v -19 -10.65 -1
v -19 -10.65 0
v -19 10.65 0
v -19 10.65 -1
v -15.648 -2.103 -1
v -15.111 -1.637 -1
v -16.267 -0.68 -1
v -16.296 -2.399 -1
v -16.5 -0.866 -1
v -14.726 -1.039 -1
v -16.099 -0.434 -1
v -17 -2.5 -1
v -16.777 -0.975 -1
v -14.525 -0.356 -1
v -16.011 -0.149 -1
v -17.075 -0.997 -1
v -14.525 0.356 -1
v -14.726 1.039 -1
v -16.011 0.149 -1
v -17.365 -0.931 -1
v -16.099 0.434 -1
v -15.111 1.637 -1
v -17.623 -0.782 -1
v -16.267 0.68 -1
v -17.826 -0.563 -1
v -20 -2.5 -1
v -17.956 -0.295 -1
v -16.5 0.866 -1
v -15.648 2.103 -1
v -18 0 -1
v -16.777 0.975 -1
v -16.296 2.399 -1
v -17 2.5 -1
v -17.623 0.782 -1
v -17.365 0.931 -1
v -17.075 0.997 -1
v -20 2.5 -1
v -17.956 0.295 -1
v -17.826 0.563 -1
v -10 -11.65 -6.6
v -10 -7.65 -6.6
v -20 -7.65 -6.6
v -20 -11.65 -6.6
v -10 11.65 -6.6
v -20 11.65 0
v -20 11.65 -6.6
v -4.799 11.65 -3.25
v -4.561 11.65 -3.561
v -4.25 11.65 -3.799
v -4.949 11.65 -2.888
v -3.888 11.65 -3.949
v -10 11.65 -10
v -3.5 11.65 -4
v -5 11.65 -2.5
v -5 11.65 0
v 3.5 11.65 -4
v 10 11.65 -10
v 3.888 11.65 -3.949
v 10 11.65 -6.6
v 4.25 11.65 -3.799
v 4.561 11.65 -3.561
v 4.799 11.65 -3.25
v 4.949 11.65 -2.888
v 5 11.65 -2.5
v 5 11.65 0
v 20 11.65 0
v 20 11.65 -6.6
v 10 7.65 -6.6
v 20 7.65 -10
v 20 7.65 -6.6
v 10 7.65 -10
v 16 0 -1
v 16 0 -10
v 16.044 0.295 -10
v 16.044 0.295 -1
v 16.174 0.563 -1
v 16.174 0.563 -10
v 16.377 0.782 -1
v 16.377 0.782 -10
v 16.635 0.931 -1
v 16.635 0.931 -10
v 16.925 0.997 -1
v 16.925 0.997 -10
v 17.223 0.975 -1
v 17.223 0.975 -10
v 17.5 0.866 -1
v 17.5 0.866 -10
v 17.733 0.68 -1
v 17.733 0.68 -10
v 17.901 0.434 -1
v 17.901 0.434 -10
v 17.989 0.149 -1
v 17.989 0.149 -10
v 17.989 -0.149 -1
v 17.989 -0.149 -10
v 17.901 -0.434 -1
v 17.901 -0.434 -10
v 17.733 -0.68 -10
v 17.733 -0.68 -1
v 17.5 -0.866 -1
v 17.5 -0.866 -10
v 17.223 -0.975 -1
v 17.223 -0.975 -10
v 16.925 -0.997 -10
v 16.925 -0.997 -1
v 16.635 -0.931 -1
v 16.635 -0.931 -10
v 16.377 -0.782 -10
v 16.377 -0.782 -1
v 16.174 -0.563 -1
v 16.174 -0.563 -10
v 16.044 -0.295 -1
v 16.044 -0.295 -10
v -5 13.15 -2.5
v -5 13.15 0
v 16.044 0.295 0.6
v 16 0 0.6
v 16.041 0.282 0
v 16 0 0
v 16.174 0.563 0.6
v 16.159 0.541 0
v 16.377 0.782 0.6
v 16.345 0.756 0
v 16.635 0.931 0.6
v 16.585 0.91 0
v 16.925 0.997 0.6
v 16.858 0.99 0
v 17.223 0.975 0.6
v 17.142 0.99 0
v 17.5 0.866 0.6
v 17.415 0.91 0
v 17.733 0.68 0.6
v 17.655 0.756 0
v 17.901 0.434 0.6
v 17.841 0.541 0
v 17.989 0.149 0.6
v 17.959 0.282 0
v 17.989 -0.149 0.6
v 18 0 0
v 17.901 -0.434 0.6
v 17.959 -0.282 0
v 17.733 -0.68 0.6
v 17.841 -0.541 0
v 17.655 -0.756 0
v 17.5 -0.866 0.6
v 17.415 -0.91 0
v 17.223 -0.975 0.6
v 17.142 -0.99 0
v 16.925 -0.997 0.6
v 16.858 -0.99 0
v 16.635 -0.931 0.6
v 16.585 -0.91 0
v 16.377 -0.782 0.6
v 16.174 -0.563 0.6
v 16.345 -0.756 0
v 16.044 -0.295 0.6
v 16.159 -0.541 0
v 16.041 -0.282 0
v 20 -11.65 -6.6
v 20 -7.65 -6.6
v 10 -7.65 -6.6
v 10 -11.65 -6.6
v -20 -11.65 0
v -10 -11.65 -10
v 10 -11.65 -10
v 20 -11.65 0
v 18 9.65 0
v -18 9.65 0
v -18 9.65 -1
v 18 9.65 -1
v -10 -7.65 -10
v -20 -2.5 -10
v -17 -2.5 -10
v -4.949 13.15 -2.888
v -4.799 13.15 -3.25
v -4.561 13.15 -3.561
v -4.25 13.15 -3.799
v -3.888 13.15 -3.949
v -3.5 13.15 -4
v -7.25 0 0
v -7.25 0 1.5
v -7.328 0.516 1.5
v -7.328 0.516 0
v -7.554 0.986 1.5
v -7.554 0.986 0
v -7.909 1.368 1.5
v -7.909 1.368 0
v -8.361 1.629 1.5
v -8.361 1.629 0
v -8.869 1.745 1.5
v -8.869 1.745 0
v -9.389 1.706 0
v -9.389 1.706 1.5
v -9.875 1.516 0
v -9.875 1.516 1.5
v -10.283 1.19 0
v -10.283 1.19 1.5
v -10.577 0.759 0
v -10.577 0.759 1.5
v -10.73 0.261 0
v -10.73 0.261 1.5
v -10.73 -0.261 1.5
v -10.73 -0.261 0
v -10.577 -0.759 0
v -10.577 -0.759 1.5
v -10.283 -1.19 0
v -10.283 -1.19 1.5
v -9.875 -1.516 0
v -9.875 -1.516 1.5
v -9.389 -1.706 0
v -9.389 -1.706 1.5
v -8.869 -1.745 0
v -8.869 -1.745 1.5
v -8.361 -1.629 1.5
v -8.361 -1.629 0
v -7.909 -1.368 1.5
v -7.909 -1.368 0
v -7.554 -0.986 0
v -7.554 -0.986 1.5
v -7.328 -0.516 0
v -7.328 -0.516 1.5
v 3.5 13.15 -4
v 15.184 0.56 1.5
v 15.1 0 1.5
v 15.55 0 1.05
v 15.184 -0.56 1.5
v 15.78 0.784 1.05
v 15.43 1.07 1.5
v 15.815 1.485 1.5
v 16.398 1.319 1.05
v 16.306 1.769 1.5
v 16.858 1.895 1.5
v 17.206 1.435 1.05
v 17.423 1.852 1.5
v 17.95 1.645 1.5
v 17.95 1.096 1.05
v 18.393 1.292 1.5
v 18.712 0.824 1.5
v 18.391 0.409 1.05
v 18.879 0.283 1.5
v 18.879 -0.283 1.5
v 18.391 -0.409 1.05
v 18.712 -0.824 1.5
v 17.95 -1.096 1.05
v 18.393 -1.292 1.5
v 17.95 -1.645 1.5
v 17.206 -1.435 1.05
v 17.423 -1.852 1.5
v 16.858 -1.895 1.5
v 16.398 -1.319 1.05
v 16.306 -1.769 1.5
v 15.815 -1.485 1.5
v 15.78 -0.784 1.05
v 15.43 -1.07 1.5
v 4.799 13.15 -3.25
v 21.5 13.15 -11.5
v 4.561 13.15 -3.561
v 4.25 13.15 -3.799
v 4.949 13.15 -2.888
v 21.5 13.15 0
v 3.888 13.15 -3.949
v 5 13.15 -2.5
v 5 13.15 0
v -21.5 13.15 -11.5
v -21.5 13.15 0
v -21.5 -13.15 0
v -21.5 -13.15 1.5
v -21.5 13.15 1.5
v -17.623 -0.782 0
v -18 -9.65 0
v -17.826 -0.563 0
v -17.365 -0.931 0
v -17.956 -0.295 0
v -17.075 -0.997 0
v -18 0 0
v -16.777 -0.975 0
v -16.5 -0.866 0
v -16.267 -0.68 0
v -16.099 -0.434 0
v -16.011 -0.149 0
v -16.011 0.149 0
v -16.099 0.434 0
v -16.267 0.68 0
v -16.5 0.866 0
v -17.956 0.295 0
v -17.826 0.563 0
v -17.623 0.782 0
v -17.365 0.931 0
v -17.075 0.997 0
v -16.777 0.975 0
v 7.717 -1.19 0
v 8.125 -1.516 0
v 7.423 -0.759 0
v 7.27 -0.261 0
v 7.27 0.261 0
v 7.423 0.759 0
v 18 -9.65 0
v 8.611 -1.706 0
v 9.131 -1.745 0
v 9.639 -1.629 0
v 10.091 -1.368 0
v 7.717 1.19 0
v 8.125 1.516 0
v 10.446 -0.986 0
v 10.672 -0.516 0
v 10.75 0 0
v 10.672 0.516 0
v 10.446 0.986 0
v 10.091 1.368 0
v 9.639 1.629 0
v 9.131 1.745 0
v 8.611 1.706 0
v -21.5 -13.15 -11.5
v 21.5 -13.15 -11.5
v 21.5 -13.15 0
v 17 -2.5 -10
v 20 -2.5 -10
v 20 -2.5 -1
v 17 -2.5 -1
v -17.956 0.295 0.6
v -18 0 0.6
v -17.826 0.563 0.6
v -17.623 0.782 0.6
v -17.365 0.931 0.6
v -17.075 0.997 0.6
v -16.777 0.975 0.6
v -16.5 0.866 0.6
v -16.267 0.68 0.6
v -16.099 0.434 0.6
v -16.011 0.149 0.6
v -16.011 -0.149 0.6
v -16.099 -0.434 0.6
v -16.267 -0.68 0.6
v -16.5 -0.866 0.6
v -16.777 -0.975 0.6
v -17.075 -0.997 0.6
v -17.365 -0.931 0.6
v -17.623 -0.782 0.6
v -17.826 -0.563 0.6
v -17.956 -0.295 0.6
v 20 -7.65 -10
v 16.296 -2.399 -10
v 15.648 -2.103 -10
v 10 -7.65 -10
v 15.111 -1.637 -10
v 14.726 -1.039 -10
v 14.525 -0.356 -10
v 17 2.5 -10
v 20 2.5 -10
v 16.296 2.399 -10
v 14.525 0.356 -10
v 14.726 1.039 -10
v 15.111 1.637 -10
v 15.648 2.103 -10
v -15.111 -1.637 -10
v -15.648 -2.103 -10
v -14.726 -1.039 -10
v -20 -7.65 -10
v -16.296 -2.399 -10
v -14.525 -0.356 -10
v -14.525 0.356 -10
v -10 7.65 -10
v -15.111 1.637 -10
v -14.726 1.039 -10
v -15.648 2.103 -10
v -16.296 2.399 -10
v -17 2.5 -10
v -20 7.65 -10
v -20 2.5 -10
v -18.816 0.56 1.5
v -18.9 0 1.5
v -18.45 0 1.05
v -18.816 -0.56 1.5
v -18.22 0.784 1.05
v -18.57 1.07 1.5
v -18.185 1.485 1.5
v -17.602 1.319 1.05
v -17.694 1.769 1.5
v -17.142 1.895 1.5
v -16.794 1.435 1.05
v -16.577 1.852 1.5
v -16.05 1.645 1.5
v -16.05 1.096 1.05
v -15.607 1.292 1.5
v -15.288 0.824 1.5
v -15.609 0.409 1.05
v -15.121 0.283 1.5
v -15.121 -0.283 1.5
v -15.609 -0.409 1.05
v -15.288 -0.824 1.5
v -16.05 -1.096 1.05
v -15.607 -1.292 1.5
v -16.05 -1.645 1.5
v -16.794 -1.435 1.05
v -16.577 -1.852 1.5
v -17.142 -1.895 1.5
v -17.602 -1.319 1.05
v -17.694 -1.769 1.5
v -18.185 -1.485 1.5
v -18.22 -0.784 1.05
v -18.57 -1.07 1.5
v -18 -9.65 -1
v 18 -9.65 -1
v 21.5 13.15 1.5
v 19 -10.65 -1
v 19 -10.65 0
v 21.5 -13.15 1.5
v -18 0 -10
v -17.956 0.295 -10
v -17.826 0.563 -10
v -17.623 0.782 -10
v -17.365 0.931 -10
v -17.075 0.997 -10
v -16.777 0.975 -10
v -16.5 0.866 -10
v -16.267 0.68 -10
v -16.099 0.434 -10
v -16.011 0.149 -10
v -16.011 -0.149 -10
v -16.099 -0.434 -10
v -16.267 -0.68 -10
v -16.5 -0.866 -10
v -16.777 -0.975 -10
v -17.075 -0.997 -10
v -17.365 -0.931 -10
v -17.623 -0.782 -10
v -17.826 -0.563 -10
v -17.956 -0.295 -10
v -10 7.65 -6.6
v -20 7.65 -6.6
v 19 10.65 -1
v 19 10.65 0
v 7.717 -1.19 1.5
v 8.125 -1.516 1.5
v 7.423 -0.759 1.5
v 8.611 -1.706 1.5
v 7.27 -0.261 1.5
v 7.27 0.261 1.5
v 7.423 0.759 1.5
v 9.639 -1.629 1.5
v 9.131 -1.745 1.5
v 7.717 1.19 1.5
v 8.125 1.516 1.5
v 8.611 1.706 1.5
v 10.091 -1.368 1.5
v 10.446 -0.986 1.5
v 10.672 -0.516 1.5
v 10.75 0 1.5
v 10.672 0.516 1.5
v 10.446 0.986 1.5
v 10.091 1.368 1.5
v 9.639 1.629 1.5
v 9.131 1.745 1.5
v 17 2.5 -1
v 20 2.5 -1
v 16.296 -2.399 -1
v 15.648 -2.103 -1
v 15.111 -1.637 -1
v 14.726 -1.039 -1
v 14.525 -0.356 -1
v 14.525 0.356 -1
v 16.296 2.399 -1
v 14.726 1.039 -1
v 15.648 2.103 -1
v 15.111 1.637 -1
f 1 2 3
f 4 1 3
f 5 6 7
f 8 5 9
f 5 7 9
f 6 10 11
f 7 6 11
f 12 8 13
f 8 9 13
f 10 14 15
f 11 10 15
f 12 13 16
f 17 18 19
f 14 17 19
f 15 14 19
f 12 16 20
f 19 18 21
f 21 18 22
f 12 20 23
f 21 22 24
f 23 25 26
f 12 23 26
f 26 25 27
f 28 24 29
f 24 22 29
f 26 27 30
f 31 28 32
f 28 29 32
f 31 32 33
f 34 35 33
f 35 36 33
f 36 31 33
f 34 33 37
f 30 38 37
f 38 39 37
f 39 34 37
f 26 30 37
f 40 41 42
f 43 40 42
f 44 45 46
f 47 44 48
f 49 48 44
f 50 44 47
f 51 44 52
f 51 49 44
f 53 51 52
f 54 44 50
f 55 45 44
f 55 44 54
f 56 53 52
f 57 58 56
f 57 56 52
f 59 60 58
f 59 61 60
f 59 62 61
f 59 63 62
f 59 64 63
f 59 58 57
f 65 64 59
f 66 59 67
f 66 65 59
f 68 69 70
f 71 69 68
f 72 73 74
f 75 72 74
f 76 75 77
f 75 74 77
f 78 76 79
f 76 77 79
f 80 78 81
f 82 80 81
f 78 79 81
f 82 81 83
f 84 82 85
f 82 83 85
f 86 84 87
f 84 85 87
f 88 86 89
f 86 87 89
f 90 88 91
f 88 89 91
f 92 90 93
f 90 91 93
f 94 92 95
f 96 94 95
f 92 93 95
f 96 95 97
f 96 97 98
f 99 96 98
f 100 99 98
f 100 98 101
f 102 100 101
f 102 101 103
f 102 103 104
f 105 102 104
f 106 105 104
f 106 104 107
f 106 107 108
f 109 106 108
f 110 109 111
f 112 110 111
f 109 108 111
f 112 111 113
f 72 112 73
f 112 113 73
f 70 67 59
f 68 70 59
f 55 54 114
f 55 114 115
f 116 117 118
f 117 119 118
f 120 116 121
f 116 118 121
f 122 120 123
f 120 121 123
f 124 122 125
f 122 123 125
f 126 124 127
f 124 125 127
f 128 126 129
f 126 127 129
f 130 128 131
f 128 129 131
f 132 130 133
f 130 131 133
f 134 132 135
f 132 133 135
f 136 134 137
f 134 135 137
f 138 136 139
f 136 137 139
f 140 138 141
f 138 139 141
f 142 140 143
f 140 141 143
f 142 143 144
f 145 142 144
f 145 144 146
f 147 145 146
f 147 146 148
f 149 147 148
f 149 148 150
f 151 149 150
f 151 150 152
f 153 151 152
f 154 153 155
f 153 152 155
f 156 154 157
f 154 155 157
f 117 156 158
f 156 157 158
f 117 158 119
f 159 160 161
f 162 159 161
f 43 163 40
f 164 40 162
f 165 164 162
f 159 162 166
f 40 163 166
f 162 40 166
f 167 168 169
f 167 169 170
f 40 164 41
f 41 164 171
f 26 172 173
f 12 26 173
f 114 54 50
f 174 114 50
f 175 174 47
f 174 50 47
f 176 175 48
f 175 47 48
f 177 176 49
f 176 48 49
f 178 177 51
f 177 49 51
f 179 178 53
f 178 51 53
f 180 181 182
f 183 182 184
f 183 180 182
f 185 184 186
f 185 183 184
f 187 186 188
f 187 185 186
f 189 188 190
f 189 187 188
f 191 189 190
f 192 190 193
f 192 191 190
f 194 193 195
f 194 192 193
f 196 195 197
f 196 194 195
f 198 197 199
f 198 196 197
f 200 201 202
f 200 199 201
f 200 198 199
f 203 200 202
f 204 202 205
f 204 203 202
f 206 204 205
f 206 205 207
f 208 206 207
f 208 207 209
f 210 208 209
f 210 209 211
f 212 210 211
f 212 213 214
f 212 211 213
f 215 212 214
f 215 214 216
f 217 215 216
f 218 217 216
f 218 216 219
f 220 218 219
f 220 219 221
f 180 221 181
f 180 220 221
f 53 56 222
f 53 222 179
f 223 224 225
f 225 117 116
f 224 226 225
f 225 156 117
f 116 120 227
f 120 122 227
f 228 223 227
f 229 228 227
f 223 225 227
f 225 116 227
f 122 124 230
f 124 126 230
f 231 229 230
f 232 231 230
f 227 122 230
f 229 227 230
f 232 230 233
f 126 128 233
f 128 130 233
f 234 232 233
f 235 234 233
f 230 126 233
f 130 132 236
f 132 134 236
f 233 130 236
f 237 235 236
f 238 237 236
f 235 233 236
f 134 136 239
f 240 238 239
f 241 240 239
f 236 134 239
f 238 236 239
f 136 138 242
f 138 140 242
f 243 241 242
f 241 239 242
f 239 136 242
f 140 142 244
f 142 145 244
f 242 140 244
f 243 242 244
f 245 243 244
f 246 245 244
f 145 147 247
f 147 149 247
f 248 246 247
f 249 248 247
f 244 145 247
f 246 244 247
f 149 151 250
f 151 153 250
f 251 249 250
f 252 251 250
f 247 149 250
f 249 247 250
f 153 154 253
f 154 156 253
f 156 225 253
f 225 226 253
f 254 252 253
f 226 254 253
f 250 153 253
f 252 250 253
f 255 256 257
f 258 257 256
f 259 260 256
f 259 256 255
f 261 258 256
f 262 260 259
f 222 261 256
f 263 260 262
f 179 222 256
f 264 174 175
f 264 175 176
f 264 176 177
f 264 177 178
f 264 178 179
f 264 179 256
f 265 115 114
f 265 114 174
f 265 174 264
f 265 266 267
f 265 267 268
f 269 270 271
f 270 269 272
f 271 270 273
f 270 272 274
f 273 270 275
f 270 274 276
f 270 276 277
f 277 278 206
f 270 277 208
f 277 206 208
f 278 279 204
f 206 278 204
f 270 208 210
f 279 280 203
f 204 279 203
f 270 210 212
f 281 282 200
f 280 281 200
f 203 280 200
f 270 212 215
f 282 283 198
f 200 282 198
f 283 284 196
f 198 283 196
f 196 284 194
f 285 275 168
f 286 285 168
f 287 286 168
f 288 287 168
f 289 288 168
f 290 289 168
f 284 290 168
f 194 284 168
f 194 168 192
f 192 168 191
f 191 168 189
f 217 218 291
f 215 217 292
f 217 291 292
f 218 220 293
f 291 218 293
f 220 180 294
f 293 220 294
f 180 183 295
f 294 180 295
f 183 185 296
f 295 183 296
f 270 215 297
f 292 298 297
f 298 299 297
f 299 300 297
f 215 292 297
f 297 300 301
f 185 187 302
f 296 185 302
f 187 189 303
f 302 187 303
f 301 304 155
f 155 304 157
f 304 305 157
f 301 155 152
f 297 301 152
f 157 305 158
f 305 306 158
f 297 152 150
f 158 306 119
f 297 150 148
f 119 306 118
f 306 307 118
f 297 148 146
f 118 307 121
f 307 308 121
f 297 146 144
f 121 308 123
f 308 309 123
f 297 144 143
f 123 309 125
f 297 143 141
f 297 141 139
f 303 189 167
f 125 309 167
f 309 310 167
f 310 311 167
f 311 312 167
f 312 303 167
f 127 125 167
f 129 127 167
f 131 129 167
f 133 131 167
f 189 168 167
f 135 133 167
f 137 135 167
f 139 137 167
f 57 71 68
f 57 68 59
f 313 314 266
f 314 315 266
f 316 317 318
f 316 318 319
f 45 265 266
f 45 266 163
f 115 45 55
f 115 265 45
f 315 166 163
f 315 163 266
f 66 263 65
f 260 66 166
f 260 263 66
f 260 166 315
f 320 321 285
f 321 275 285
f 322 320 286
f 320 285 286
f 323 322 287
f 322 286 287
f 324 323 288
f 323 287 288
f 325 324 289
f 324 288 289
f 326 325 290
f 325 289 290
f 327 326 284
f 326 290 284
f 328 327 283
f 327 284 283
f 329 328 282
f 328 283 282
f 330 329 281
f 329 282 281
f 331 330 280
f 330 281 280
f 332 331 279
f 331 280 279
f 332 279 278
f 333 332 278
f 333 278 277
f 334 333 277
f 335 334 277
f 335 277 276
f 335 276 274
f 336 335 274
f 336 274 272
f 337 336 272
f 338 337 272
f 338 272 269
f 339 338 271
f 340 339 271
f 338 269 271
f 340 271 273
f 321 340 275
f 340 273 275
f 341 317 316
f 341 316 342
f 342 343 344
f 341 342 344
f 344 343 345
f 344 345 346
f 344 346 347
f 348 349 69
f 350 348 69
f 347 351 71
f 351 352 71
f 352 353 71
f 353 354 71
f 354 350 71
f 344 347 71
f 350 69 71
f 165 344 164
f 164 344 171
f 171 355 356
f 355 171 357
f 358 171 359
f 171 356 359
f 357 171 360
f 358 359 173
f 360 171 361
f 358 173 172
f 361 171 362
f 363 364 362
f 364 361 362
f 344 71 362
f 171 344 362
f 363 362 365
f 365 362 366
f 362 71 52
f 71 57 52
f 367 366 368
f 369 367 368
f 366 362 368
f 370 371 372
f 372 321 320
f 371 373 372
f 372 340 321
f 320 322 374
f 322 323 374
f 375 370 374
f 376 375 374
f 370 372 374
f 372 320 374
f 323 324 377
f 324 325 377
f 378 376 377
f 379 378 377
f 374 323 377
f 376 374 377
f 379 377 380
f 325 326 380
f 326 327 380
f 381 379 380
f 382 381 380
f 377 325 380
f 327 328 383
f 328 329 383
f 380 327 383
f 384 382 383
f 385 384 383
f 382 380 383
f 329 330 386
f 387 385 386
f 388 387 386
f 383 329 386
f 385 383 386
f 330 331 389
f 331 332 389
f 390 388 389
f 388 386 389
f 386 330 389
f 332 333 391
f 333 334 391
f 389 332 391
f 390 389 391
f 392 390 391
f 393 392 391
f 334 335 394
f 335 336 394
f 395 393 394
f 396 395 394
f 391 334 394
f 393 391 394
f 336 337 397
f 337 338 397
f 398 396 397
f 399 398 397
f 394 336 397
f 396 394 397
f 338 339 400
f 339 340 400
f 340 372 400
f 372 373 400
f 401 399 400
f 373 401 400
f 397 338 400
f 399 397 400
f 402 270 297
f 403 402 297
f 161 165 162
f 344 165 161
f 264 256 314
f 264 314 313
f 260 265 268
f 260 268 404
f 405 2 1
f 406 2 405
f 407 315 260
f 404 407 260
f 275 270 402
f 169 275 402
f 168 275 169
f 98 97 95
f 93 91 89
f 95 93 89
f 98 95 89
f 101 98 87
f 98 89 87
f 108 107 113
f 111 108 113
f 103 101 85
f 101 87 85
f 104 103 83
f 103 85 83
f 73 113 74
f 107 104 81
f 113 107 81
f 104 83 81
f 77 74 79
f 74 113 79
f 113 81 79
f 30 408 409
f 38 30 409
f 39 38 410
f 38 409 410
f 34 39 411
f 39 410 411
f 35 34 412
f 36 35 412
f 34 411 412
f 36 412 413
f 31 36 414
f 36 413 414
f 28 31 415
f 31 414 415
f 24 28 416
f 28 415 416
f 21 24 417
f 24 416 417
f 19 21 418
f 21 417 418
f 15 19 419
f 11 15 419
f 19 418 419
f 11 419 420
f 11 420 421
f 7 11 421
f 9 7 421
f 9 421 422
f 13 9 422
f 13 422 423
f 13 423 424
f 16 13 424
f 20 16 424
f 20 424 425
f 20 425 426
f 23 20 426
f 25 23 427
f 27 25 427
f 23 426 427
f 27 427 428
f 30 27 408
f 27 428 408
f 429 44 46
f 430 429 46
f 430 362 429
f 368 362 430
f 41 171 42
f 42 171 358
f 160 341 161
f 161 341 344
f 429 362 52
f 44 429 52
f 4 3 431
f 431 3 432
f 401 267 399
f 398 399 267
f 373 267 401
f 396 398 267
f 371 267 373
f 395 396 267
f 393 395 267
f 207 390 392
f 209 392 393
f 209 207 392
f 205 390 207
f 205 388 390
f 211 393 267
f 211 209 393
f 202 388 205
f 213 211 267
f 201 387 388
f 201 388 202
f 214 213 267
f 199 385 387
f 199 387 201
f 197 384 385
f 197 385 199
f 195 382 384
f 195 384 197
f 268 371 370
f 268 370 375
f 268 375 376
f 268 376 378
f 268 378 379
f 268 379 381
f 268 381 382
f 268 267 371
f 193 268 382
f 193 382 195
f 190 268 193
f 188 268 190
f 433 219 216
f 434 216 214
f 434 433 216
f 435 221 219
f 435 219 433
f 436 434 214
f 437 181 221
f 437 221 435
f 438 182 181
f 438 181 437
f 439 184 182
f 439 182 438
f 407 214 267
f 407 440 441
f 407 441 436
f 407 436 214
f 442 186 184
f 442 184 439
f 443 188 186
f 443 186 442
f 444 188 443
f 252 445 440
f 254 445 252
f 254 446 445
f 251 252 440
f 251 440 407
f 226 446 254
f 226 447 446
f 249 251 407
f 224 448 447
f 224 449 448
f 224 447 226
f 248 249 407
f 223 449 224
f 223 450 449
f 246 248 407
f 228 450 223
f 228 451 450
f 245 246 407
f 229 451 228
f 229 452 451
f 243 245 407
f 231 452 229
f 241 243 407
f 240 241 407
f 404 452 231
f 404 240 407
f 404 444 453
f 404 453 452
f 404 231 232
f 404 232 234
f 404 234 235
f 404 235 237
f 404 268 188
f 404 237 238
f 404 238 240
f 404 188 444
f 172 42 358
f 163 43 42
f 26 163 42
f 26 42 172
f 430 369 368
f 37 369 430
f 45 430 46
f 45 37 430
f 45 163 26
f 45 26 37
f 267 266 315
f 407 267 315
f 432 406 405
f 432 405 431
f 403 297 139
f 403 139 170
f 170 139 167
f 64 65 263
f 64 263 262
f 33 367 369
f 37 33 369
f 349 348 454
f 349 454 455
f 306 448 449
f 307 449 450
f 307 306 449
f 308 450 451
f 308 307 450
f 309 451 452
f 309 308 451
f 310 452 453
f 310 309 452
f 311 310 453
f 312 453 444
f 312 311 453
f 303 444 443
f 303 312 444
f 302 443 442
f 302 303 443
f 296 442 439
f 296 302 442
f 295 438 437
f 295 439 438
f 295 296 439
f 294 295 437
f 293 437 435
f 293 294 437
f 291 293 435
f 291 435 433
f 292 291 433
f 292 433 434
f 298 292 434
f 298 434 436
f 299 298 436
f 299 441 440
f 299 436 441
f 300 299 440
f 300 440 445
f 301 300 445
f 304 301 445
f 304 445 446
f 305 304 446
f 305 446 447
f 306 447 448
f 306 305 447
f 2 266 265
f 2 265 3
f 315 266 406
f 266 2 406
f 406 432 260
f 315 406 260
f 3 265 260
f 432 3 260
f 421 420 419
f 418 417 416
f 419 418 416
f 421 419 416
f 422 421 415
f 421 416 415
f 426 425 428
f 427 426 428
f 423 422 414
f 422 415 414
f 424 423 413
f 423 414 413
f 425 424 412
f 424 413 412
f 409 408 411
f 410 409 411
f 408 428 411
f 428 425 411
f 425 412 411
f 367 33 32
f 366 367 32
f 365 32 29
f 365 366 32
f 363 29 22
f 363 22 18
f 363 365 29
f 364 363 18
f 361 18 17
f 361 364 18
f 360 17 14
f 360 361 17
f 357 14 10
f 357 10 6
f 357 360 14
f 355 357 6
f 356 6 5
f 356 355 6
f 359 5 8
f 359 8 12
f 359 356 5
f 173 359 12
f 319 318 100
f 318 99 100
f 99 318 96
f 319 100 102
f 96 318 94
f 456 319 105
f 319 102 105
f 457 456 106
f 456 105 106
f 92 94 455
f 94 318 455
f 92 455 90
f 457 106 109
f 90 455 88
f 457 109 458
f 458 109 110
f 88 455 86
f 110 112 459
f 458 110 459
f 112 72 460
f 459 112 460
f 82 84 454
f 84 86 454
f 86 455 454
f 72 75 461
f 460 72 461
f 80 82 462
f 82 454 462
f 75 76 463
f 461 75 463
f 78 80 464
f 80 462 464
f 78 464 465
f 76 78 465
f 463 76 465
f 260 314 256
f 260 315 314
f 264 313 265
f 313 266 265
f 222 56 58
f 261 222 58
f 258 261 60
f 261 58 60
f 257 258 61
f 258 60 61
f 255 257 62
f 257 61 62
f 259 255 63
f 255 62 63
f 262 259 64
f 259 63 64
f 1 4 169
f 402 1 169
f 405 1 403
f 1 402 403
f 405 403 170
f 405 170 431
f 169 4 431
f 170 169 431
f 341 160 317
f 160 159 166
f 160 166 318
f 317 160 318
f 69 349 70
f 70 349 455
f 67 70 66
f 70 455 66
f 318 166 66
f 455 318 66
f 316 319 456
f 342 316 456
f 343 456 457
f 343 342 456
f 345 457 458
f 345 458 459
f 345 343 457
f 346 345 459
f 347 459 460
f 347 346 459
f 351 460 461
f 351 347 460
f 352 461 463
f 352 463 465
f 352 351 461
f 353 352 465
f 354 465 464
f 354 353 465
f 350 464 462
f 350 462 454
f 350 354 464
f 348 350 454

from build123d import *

# Parameters (mm, degrees)
SKETCH_W         = 43
SKETCH_H         = 26.3
SKETCH_W_2       = 40
SKETCH_H_2       = 23.3
PAD_DEPTH        = 10
SKETCH001_W      = 43
SKETCH001_H      = 26.3
PAD001_DEPTH     = 1.5
SKETCH003_W      = 10
SKETCH003_H      = 4
PAD003_DEPTH     = 3.4
SKETCH004_R      = 1
PAD004_DEPTH     = 9
POCKET001_DEPTH  = 13.151
SKETCH002_W      = 43
SKETCH002_H      = 26.3
PAD002_DEPTH     = 1.5
SKETCH005_R      = 1.75
POCKET_DEPTH     = 5
SKETCH006_W      = 38
SKETCH006_H      = 21.3
SKETCH006_W_2    = 36
SKETCH006_H_2    = 19.3
PAD005_DEPTH     = 1
HOLE_D           = 2
HOLE_DEPTH       = 25
HOLE_CSINK_D     = 3.8
HOLE_CSINK_ANGLE = 90


with BuildPart() as body:
    # Sketch → Pad (new body)
    with BuildSketch(Plane.XY):
        Rectangle(SKETCH_W, SKETCH_H)
        Rectangle(SKETCH_W_2, SKETCH_H_2, mode=Mode.SUBTRACT)
    extrude(amount=-PAD_DEPTH)

    # Sketch001 (on DatumPlane) → Pad001 (join)
    with BuildSketch(Plane(origin=(0, 0, -10), x_dir=(-1, 0, 0), z_dir=(0, 0, -1))):
        Rectangle(SKETCH001_W, SKETCH001_H)
    extrude(amount=PAD001_DEPTH)

    # Sketch003 (on DatumPlane) → Pad003 (join)
    with BuildSketch(Plane(origin=(0, 0, -10), x_dir=(-1, 0, 0), z_dir=(0, 0, -1))):
        with Locations((-15, 9.65)):
            Rectangle(SKETCH003_W, SKETCH003_H)
        with Locations((15, 9.65)):
            Rectangle(SKETCH003_W, SKETCH003_H)
        with Locations((15, -9.65)):
            Rectangle(SKETCH003_W, SKETCH003_H)
        with Locations((-15, -9.65)):
            Rectangle(SKETCH003_W, SKETCH003_H)
    extrude(amount=-PAD003_DEPTH)

    # Sketch004 (on DatumPlane) → Pad004 (join)
    with BuildSketch(Plane(origin=(0, 0, -10), x_dir=(-1, 0, 0), z_dir=(0, 0, -1))):
        with BuildLine():
            ThreePointArc((-17, -2.5), (-14.5, 0), (-17, 2.5))
            Line((-17, 2.5), (-20, 2.5))
            Line((-20, 2.5), (-20, -2.5))
            Line((-20, -2.5), (-17, -2.5))
        make_face()
        with Locations((-17, 0)):
            Circle(SKETCH004_R, mode=Mode.SUBTRACT)
        with BuildLine():
            ThreePointArc((17, 2.5), (14.5, 0), (17, -2.5))
            Line((20, -2.5), (17, -2.5))
            Line((20, 2.5), (20, -2.5))
            Line((17, 2.5), (20, 2.5))
        make_face()
        with Locations((17, 0)):
            Circle(SKETCH004_R, mode=Mode.SUBTRACT)
    extrude(amount=-PAD004_DEPTH)

    # Sketch008 → Pocket001 (cut, through all)
    with BuildSketch(Plane.XZ):
        with BuildLine():
            Line((-5, 0), (5, 0))
            Line((5, 0), (5, -2.5))
            ThreePointArc((3.5, -4), (4.56066, -3.56066), (5, -2.5))
            Line((3.5, -4), (-3.5, -4))
            ThreePointArc((-5, -2.5), (-4.56066, -3.56066), (-3.5, -4))
            Line((-5, -2.5), (-5, 0))
        make_face()
    extrude(amount=-POCKET001_DEPTH, mode=Mode.SUBTRACT)


with BuildPart() as body001:
    # Sketch002 → Pad002 (new body)
    with BuildSketch(Plane.XY):
        Rectangle(SKETCH002_W, SKETCH002_H)
    extrude(amount=PAD002_DEPTH)

    # Sketch005 → Pocket (cut)
    with BuildSketch(Plane.XY):
        with Locations((-9, 0)):
            Circle(SKETCH005_R)
        with Locations((9, 0)):
            Circle(SKETCH005_R)
    extrude(amount=POCKET_DEPTH, mode=Mode.SUBTRACT)

    # Sketch006 → Pad005 (join)
    with BuildSketch(Plane.XY):
        Rectangle(SKETCH006_W, SKETCH006_H)
        Rectangle(SKETCH006_W_2, SKETCH006_H_2, mode=Mode.SUBTRACT)
    extrude(amount=-PAD005_DEPTH)

    # Hole
    with Locations(Plane.XY.offset(1.5)):
        with Locations((-17, 0), (17, 0)):
            CounterSinkHole(HOLE_D / 2, HOLE_CSINK_D / 2, depth=HOLE_DEPTH, counter_sink_angle=HOLE_CSINK_ANGLE)


solid = Compound([body.part, body001.part])
